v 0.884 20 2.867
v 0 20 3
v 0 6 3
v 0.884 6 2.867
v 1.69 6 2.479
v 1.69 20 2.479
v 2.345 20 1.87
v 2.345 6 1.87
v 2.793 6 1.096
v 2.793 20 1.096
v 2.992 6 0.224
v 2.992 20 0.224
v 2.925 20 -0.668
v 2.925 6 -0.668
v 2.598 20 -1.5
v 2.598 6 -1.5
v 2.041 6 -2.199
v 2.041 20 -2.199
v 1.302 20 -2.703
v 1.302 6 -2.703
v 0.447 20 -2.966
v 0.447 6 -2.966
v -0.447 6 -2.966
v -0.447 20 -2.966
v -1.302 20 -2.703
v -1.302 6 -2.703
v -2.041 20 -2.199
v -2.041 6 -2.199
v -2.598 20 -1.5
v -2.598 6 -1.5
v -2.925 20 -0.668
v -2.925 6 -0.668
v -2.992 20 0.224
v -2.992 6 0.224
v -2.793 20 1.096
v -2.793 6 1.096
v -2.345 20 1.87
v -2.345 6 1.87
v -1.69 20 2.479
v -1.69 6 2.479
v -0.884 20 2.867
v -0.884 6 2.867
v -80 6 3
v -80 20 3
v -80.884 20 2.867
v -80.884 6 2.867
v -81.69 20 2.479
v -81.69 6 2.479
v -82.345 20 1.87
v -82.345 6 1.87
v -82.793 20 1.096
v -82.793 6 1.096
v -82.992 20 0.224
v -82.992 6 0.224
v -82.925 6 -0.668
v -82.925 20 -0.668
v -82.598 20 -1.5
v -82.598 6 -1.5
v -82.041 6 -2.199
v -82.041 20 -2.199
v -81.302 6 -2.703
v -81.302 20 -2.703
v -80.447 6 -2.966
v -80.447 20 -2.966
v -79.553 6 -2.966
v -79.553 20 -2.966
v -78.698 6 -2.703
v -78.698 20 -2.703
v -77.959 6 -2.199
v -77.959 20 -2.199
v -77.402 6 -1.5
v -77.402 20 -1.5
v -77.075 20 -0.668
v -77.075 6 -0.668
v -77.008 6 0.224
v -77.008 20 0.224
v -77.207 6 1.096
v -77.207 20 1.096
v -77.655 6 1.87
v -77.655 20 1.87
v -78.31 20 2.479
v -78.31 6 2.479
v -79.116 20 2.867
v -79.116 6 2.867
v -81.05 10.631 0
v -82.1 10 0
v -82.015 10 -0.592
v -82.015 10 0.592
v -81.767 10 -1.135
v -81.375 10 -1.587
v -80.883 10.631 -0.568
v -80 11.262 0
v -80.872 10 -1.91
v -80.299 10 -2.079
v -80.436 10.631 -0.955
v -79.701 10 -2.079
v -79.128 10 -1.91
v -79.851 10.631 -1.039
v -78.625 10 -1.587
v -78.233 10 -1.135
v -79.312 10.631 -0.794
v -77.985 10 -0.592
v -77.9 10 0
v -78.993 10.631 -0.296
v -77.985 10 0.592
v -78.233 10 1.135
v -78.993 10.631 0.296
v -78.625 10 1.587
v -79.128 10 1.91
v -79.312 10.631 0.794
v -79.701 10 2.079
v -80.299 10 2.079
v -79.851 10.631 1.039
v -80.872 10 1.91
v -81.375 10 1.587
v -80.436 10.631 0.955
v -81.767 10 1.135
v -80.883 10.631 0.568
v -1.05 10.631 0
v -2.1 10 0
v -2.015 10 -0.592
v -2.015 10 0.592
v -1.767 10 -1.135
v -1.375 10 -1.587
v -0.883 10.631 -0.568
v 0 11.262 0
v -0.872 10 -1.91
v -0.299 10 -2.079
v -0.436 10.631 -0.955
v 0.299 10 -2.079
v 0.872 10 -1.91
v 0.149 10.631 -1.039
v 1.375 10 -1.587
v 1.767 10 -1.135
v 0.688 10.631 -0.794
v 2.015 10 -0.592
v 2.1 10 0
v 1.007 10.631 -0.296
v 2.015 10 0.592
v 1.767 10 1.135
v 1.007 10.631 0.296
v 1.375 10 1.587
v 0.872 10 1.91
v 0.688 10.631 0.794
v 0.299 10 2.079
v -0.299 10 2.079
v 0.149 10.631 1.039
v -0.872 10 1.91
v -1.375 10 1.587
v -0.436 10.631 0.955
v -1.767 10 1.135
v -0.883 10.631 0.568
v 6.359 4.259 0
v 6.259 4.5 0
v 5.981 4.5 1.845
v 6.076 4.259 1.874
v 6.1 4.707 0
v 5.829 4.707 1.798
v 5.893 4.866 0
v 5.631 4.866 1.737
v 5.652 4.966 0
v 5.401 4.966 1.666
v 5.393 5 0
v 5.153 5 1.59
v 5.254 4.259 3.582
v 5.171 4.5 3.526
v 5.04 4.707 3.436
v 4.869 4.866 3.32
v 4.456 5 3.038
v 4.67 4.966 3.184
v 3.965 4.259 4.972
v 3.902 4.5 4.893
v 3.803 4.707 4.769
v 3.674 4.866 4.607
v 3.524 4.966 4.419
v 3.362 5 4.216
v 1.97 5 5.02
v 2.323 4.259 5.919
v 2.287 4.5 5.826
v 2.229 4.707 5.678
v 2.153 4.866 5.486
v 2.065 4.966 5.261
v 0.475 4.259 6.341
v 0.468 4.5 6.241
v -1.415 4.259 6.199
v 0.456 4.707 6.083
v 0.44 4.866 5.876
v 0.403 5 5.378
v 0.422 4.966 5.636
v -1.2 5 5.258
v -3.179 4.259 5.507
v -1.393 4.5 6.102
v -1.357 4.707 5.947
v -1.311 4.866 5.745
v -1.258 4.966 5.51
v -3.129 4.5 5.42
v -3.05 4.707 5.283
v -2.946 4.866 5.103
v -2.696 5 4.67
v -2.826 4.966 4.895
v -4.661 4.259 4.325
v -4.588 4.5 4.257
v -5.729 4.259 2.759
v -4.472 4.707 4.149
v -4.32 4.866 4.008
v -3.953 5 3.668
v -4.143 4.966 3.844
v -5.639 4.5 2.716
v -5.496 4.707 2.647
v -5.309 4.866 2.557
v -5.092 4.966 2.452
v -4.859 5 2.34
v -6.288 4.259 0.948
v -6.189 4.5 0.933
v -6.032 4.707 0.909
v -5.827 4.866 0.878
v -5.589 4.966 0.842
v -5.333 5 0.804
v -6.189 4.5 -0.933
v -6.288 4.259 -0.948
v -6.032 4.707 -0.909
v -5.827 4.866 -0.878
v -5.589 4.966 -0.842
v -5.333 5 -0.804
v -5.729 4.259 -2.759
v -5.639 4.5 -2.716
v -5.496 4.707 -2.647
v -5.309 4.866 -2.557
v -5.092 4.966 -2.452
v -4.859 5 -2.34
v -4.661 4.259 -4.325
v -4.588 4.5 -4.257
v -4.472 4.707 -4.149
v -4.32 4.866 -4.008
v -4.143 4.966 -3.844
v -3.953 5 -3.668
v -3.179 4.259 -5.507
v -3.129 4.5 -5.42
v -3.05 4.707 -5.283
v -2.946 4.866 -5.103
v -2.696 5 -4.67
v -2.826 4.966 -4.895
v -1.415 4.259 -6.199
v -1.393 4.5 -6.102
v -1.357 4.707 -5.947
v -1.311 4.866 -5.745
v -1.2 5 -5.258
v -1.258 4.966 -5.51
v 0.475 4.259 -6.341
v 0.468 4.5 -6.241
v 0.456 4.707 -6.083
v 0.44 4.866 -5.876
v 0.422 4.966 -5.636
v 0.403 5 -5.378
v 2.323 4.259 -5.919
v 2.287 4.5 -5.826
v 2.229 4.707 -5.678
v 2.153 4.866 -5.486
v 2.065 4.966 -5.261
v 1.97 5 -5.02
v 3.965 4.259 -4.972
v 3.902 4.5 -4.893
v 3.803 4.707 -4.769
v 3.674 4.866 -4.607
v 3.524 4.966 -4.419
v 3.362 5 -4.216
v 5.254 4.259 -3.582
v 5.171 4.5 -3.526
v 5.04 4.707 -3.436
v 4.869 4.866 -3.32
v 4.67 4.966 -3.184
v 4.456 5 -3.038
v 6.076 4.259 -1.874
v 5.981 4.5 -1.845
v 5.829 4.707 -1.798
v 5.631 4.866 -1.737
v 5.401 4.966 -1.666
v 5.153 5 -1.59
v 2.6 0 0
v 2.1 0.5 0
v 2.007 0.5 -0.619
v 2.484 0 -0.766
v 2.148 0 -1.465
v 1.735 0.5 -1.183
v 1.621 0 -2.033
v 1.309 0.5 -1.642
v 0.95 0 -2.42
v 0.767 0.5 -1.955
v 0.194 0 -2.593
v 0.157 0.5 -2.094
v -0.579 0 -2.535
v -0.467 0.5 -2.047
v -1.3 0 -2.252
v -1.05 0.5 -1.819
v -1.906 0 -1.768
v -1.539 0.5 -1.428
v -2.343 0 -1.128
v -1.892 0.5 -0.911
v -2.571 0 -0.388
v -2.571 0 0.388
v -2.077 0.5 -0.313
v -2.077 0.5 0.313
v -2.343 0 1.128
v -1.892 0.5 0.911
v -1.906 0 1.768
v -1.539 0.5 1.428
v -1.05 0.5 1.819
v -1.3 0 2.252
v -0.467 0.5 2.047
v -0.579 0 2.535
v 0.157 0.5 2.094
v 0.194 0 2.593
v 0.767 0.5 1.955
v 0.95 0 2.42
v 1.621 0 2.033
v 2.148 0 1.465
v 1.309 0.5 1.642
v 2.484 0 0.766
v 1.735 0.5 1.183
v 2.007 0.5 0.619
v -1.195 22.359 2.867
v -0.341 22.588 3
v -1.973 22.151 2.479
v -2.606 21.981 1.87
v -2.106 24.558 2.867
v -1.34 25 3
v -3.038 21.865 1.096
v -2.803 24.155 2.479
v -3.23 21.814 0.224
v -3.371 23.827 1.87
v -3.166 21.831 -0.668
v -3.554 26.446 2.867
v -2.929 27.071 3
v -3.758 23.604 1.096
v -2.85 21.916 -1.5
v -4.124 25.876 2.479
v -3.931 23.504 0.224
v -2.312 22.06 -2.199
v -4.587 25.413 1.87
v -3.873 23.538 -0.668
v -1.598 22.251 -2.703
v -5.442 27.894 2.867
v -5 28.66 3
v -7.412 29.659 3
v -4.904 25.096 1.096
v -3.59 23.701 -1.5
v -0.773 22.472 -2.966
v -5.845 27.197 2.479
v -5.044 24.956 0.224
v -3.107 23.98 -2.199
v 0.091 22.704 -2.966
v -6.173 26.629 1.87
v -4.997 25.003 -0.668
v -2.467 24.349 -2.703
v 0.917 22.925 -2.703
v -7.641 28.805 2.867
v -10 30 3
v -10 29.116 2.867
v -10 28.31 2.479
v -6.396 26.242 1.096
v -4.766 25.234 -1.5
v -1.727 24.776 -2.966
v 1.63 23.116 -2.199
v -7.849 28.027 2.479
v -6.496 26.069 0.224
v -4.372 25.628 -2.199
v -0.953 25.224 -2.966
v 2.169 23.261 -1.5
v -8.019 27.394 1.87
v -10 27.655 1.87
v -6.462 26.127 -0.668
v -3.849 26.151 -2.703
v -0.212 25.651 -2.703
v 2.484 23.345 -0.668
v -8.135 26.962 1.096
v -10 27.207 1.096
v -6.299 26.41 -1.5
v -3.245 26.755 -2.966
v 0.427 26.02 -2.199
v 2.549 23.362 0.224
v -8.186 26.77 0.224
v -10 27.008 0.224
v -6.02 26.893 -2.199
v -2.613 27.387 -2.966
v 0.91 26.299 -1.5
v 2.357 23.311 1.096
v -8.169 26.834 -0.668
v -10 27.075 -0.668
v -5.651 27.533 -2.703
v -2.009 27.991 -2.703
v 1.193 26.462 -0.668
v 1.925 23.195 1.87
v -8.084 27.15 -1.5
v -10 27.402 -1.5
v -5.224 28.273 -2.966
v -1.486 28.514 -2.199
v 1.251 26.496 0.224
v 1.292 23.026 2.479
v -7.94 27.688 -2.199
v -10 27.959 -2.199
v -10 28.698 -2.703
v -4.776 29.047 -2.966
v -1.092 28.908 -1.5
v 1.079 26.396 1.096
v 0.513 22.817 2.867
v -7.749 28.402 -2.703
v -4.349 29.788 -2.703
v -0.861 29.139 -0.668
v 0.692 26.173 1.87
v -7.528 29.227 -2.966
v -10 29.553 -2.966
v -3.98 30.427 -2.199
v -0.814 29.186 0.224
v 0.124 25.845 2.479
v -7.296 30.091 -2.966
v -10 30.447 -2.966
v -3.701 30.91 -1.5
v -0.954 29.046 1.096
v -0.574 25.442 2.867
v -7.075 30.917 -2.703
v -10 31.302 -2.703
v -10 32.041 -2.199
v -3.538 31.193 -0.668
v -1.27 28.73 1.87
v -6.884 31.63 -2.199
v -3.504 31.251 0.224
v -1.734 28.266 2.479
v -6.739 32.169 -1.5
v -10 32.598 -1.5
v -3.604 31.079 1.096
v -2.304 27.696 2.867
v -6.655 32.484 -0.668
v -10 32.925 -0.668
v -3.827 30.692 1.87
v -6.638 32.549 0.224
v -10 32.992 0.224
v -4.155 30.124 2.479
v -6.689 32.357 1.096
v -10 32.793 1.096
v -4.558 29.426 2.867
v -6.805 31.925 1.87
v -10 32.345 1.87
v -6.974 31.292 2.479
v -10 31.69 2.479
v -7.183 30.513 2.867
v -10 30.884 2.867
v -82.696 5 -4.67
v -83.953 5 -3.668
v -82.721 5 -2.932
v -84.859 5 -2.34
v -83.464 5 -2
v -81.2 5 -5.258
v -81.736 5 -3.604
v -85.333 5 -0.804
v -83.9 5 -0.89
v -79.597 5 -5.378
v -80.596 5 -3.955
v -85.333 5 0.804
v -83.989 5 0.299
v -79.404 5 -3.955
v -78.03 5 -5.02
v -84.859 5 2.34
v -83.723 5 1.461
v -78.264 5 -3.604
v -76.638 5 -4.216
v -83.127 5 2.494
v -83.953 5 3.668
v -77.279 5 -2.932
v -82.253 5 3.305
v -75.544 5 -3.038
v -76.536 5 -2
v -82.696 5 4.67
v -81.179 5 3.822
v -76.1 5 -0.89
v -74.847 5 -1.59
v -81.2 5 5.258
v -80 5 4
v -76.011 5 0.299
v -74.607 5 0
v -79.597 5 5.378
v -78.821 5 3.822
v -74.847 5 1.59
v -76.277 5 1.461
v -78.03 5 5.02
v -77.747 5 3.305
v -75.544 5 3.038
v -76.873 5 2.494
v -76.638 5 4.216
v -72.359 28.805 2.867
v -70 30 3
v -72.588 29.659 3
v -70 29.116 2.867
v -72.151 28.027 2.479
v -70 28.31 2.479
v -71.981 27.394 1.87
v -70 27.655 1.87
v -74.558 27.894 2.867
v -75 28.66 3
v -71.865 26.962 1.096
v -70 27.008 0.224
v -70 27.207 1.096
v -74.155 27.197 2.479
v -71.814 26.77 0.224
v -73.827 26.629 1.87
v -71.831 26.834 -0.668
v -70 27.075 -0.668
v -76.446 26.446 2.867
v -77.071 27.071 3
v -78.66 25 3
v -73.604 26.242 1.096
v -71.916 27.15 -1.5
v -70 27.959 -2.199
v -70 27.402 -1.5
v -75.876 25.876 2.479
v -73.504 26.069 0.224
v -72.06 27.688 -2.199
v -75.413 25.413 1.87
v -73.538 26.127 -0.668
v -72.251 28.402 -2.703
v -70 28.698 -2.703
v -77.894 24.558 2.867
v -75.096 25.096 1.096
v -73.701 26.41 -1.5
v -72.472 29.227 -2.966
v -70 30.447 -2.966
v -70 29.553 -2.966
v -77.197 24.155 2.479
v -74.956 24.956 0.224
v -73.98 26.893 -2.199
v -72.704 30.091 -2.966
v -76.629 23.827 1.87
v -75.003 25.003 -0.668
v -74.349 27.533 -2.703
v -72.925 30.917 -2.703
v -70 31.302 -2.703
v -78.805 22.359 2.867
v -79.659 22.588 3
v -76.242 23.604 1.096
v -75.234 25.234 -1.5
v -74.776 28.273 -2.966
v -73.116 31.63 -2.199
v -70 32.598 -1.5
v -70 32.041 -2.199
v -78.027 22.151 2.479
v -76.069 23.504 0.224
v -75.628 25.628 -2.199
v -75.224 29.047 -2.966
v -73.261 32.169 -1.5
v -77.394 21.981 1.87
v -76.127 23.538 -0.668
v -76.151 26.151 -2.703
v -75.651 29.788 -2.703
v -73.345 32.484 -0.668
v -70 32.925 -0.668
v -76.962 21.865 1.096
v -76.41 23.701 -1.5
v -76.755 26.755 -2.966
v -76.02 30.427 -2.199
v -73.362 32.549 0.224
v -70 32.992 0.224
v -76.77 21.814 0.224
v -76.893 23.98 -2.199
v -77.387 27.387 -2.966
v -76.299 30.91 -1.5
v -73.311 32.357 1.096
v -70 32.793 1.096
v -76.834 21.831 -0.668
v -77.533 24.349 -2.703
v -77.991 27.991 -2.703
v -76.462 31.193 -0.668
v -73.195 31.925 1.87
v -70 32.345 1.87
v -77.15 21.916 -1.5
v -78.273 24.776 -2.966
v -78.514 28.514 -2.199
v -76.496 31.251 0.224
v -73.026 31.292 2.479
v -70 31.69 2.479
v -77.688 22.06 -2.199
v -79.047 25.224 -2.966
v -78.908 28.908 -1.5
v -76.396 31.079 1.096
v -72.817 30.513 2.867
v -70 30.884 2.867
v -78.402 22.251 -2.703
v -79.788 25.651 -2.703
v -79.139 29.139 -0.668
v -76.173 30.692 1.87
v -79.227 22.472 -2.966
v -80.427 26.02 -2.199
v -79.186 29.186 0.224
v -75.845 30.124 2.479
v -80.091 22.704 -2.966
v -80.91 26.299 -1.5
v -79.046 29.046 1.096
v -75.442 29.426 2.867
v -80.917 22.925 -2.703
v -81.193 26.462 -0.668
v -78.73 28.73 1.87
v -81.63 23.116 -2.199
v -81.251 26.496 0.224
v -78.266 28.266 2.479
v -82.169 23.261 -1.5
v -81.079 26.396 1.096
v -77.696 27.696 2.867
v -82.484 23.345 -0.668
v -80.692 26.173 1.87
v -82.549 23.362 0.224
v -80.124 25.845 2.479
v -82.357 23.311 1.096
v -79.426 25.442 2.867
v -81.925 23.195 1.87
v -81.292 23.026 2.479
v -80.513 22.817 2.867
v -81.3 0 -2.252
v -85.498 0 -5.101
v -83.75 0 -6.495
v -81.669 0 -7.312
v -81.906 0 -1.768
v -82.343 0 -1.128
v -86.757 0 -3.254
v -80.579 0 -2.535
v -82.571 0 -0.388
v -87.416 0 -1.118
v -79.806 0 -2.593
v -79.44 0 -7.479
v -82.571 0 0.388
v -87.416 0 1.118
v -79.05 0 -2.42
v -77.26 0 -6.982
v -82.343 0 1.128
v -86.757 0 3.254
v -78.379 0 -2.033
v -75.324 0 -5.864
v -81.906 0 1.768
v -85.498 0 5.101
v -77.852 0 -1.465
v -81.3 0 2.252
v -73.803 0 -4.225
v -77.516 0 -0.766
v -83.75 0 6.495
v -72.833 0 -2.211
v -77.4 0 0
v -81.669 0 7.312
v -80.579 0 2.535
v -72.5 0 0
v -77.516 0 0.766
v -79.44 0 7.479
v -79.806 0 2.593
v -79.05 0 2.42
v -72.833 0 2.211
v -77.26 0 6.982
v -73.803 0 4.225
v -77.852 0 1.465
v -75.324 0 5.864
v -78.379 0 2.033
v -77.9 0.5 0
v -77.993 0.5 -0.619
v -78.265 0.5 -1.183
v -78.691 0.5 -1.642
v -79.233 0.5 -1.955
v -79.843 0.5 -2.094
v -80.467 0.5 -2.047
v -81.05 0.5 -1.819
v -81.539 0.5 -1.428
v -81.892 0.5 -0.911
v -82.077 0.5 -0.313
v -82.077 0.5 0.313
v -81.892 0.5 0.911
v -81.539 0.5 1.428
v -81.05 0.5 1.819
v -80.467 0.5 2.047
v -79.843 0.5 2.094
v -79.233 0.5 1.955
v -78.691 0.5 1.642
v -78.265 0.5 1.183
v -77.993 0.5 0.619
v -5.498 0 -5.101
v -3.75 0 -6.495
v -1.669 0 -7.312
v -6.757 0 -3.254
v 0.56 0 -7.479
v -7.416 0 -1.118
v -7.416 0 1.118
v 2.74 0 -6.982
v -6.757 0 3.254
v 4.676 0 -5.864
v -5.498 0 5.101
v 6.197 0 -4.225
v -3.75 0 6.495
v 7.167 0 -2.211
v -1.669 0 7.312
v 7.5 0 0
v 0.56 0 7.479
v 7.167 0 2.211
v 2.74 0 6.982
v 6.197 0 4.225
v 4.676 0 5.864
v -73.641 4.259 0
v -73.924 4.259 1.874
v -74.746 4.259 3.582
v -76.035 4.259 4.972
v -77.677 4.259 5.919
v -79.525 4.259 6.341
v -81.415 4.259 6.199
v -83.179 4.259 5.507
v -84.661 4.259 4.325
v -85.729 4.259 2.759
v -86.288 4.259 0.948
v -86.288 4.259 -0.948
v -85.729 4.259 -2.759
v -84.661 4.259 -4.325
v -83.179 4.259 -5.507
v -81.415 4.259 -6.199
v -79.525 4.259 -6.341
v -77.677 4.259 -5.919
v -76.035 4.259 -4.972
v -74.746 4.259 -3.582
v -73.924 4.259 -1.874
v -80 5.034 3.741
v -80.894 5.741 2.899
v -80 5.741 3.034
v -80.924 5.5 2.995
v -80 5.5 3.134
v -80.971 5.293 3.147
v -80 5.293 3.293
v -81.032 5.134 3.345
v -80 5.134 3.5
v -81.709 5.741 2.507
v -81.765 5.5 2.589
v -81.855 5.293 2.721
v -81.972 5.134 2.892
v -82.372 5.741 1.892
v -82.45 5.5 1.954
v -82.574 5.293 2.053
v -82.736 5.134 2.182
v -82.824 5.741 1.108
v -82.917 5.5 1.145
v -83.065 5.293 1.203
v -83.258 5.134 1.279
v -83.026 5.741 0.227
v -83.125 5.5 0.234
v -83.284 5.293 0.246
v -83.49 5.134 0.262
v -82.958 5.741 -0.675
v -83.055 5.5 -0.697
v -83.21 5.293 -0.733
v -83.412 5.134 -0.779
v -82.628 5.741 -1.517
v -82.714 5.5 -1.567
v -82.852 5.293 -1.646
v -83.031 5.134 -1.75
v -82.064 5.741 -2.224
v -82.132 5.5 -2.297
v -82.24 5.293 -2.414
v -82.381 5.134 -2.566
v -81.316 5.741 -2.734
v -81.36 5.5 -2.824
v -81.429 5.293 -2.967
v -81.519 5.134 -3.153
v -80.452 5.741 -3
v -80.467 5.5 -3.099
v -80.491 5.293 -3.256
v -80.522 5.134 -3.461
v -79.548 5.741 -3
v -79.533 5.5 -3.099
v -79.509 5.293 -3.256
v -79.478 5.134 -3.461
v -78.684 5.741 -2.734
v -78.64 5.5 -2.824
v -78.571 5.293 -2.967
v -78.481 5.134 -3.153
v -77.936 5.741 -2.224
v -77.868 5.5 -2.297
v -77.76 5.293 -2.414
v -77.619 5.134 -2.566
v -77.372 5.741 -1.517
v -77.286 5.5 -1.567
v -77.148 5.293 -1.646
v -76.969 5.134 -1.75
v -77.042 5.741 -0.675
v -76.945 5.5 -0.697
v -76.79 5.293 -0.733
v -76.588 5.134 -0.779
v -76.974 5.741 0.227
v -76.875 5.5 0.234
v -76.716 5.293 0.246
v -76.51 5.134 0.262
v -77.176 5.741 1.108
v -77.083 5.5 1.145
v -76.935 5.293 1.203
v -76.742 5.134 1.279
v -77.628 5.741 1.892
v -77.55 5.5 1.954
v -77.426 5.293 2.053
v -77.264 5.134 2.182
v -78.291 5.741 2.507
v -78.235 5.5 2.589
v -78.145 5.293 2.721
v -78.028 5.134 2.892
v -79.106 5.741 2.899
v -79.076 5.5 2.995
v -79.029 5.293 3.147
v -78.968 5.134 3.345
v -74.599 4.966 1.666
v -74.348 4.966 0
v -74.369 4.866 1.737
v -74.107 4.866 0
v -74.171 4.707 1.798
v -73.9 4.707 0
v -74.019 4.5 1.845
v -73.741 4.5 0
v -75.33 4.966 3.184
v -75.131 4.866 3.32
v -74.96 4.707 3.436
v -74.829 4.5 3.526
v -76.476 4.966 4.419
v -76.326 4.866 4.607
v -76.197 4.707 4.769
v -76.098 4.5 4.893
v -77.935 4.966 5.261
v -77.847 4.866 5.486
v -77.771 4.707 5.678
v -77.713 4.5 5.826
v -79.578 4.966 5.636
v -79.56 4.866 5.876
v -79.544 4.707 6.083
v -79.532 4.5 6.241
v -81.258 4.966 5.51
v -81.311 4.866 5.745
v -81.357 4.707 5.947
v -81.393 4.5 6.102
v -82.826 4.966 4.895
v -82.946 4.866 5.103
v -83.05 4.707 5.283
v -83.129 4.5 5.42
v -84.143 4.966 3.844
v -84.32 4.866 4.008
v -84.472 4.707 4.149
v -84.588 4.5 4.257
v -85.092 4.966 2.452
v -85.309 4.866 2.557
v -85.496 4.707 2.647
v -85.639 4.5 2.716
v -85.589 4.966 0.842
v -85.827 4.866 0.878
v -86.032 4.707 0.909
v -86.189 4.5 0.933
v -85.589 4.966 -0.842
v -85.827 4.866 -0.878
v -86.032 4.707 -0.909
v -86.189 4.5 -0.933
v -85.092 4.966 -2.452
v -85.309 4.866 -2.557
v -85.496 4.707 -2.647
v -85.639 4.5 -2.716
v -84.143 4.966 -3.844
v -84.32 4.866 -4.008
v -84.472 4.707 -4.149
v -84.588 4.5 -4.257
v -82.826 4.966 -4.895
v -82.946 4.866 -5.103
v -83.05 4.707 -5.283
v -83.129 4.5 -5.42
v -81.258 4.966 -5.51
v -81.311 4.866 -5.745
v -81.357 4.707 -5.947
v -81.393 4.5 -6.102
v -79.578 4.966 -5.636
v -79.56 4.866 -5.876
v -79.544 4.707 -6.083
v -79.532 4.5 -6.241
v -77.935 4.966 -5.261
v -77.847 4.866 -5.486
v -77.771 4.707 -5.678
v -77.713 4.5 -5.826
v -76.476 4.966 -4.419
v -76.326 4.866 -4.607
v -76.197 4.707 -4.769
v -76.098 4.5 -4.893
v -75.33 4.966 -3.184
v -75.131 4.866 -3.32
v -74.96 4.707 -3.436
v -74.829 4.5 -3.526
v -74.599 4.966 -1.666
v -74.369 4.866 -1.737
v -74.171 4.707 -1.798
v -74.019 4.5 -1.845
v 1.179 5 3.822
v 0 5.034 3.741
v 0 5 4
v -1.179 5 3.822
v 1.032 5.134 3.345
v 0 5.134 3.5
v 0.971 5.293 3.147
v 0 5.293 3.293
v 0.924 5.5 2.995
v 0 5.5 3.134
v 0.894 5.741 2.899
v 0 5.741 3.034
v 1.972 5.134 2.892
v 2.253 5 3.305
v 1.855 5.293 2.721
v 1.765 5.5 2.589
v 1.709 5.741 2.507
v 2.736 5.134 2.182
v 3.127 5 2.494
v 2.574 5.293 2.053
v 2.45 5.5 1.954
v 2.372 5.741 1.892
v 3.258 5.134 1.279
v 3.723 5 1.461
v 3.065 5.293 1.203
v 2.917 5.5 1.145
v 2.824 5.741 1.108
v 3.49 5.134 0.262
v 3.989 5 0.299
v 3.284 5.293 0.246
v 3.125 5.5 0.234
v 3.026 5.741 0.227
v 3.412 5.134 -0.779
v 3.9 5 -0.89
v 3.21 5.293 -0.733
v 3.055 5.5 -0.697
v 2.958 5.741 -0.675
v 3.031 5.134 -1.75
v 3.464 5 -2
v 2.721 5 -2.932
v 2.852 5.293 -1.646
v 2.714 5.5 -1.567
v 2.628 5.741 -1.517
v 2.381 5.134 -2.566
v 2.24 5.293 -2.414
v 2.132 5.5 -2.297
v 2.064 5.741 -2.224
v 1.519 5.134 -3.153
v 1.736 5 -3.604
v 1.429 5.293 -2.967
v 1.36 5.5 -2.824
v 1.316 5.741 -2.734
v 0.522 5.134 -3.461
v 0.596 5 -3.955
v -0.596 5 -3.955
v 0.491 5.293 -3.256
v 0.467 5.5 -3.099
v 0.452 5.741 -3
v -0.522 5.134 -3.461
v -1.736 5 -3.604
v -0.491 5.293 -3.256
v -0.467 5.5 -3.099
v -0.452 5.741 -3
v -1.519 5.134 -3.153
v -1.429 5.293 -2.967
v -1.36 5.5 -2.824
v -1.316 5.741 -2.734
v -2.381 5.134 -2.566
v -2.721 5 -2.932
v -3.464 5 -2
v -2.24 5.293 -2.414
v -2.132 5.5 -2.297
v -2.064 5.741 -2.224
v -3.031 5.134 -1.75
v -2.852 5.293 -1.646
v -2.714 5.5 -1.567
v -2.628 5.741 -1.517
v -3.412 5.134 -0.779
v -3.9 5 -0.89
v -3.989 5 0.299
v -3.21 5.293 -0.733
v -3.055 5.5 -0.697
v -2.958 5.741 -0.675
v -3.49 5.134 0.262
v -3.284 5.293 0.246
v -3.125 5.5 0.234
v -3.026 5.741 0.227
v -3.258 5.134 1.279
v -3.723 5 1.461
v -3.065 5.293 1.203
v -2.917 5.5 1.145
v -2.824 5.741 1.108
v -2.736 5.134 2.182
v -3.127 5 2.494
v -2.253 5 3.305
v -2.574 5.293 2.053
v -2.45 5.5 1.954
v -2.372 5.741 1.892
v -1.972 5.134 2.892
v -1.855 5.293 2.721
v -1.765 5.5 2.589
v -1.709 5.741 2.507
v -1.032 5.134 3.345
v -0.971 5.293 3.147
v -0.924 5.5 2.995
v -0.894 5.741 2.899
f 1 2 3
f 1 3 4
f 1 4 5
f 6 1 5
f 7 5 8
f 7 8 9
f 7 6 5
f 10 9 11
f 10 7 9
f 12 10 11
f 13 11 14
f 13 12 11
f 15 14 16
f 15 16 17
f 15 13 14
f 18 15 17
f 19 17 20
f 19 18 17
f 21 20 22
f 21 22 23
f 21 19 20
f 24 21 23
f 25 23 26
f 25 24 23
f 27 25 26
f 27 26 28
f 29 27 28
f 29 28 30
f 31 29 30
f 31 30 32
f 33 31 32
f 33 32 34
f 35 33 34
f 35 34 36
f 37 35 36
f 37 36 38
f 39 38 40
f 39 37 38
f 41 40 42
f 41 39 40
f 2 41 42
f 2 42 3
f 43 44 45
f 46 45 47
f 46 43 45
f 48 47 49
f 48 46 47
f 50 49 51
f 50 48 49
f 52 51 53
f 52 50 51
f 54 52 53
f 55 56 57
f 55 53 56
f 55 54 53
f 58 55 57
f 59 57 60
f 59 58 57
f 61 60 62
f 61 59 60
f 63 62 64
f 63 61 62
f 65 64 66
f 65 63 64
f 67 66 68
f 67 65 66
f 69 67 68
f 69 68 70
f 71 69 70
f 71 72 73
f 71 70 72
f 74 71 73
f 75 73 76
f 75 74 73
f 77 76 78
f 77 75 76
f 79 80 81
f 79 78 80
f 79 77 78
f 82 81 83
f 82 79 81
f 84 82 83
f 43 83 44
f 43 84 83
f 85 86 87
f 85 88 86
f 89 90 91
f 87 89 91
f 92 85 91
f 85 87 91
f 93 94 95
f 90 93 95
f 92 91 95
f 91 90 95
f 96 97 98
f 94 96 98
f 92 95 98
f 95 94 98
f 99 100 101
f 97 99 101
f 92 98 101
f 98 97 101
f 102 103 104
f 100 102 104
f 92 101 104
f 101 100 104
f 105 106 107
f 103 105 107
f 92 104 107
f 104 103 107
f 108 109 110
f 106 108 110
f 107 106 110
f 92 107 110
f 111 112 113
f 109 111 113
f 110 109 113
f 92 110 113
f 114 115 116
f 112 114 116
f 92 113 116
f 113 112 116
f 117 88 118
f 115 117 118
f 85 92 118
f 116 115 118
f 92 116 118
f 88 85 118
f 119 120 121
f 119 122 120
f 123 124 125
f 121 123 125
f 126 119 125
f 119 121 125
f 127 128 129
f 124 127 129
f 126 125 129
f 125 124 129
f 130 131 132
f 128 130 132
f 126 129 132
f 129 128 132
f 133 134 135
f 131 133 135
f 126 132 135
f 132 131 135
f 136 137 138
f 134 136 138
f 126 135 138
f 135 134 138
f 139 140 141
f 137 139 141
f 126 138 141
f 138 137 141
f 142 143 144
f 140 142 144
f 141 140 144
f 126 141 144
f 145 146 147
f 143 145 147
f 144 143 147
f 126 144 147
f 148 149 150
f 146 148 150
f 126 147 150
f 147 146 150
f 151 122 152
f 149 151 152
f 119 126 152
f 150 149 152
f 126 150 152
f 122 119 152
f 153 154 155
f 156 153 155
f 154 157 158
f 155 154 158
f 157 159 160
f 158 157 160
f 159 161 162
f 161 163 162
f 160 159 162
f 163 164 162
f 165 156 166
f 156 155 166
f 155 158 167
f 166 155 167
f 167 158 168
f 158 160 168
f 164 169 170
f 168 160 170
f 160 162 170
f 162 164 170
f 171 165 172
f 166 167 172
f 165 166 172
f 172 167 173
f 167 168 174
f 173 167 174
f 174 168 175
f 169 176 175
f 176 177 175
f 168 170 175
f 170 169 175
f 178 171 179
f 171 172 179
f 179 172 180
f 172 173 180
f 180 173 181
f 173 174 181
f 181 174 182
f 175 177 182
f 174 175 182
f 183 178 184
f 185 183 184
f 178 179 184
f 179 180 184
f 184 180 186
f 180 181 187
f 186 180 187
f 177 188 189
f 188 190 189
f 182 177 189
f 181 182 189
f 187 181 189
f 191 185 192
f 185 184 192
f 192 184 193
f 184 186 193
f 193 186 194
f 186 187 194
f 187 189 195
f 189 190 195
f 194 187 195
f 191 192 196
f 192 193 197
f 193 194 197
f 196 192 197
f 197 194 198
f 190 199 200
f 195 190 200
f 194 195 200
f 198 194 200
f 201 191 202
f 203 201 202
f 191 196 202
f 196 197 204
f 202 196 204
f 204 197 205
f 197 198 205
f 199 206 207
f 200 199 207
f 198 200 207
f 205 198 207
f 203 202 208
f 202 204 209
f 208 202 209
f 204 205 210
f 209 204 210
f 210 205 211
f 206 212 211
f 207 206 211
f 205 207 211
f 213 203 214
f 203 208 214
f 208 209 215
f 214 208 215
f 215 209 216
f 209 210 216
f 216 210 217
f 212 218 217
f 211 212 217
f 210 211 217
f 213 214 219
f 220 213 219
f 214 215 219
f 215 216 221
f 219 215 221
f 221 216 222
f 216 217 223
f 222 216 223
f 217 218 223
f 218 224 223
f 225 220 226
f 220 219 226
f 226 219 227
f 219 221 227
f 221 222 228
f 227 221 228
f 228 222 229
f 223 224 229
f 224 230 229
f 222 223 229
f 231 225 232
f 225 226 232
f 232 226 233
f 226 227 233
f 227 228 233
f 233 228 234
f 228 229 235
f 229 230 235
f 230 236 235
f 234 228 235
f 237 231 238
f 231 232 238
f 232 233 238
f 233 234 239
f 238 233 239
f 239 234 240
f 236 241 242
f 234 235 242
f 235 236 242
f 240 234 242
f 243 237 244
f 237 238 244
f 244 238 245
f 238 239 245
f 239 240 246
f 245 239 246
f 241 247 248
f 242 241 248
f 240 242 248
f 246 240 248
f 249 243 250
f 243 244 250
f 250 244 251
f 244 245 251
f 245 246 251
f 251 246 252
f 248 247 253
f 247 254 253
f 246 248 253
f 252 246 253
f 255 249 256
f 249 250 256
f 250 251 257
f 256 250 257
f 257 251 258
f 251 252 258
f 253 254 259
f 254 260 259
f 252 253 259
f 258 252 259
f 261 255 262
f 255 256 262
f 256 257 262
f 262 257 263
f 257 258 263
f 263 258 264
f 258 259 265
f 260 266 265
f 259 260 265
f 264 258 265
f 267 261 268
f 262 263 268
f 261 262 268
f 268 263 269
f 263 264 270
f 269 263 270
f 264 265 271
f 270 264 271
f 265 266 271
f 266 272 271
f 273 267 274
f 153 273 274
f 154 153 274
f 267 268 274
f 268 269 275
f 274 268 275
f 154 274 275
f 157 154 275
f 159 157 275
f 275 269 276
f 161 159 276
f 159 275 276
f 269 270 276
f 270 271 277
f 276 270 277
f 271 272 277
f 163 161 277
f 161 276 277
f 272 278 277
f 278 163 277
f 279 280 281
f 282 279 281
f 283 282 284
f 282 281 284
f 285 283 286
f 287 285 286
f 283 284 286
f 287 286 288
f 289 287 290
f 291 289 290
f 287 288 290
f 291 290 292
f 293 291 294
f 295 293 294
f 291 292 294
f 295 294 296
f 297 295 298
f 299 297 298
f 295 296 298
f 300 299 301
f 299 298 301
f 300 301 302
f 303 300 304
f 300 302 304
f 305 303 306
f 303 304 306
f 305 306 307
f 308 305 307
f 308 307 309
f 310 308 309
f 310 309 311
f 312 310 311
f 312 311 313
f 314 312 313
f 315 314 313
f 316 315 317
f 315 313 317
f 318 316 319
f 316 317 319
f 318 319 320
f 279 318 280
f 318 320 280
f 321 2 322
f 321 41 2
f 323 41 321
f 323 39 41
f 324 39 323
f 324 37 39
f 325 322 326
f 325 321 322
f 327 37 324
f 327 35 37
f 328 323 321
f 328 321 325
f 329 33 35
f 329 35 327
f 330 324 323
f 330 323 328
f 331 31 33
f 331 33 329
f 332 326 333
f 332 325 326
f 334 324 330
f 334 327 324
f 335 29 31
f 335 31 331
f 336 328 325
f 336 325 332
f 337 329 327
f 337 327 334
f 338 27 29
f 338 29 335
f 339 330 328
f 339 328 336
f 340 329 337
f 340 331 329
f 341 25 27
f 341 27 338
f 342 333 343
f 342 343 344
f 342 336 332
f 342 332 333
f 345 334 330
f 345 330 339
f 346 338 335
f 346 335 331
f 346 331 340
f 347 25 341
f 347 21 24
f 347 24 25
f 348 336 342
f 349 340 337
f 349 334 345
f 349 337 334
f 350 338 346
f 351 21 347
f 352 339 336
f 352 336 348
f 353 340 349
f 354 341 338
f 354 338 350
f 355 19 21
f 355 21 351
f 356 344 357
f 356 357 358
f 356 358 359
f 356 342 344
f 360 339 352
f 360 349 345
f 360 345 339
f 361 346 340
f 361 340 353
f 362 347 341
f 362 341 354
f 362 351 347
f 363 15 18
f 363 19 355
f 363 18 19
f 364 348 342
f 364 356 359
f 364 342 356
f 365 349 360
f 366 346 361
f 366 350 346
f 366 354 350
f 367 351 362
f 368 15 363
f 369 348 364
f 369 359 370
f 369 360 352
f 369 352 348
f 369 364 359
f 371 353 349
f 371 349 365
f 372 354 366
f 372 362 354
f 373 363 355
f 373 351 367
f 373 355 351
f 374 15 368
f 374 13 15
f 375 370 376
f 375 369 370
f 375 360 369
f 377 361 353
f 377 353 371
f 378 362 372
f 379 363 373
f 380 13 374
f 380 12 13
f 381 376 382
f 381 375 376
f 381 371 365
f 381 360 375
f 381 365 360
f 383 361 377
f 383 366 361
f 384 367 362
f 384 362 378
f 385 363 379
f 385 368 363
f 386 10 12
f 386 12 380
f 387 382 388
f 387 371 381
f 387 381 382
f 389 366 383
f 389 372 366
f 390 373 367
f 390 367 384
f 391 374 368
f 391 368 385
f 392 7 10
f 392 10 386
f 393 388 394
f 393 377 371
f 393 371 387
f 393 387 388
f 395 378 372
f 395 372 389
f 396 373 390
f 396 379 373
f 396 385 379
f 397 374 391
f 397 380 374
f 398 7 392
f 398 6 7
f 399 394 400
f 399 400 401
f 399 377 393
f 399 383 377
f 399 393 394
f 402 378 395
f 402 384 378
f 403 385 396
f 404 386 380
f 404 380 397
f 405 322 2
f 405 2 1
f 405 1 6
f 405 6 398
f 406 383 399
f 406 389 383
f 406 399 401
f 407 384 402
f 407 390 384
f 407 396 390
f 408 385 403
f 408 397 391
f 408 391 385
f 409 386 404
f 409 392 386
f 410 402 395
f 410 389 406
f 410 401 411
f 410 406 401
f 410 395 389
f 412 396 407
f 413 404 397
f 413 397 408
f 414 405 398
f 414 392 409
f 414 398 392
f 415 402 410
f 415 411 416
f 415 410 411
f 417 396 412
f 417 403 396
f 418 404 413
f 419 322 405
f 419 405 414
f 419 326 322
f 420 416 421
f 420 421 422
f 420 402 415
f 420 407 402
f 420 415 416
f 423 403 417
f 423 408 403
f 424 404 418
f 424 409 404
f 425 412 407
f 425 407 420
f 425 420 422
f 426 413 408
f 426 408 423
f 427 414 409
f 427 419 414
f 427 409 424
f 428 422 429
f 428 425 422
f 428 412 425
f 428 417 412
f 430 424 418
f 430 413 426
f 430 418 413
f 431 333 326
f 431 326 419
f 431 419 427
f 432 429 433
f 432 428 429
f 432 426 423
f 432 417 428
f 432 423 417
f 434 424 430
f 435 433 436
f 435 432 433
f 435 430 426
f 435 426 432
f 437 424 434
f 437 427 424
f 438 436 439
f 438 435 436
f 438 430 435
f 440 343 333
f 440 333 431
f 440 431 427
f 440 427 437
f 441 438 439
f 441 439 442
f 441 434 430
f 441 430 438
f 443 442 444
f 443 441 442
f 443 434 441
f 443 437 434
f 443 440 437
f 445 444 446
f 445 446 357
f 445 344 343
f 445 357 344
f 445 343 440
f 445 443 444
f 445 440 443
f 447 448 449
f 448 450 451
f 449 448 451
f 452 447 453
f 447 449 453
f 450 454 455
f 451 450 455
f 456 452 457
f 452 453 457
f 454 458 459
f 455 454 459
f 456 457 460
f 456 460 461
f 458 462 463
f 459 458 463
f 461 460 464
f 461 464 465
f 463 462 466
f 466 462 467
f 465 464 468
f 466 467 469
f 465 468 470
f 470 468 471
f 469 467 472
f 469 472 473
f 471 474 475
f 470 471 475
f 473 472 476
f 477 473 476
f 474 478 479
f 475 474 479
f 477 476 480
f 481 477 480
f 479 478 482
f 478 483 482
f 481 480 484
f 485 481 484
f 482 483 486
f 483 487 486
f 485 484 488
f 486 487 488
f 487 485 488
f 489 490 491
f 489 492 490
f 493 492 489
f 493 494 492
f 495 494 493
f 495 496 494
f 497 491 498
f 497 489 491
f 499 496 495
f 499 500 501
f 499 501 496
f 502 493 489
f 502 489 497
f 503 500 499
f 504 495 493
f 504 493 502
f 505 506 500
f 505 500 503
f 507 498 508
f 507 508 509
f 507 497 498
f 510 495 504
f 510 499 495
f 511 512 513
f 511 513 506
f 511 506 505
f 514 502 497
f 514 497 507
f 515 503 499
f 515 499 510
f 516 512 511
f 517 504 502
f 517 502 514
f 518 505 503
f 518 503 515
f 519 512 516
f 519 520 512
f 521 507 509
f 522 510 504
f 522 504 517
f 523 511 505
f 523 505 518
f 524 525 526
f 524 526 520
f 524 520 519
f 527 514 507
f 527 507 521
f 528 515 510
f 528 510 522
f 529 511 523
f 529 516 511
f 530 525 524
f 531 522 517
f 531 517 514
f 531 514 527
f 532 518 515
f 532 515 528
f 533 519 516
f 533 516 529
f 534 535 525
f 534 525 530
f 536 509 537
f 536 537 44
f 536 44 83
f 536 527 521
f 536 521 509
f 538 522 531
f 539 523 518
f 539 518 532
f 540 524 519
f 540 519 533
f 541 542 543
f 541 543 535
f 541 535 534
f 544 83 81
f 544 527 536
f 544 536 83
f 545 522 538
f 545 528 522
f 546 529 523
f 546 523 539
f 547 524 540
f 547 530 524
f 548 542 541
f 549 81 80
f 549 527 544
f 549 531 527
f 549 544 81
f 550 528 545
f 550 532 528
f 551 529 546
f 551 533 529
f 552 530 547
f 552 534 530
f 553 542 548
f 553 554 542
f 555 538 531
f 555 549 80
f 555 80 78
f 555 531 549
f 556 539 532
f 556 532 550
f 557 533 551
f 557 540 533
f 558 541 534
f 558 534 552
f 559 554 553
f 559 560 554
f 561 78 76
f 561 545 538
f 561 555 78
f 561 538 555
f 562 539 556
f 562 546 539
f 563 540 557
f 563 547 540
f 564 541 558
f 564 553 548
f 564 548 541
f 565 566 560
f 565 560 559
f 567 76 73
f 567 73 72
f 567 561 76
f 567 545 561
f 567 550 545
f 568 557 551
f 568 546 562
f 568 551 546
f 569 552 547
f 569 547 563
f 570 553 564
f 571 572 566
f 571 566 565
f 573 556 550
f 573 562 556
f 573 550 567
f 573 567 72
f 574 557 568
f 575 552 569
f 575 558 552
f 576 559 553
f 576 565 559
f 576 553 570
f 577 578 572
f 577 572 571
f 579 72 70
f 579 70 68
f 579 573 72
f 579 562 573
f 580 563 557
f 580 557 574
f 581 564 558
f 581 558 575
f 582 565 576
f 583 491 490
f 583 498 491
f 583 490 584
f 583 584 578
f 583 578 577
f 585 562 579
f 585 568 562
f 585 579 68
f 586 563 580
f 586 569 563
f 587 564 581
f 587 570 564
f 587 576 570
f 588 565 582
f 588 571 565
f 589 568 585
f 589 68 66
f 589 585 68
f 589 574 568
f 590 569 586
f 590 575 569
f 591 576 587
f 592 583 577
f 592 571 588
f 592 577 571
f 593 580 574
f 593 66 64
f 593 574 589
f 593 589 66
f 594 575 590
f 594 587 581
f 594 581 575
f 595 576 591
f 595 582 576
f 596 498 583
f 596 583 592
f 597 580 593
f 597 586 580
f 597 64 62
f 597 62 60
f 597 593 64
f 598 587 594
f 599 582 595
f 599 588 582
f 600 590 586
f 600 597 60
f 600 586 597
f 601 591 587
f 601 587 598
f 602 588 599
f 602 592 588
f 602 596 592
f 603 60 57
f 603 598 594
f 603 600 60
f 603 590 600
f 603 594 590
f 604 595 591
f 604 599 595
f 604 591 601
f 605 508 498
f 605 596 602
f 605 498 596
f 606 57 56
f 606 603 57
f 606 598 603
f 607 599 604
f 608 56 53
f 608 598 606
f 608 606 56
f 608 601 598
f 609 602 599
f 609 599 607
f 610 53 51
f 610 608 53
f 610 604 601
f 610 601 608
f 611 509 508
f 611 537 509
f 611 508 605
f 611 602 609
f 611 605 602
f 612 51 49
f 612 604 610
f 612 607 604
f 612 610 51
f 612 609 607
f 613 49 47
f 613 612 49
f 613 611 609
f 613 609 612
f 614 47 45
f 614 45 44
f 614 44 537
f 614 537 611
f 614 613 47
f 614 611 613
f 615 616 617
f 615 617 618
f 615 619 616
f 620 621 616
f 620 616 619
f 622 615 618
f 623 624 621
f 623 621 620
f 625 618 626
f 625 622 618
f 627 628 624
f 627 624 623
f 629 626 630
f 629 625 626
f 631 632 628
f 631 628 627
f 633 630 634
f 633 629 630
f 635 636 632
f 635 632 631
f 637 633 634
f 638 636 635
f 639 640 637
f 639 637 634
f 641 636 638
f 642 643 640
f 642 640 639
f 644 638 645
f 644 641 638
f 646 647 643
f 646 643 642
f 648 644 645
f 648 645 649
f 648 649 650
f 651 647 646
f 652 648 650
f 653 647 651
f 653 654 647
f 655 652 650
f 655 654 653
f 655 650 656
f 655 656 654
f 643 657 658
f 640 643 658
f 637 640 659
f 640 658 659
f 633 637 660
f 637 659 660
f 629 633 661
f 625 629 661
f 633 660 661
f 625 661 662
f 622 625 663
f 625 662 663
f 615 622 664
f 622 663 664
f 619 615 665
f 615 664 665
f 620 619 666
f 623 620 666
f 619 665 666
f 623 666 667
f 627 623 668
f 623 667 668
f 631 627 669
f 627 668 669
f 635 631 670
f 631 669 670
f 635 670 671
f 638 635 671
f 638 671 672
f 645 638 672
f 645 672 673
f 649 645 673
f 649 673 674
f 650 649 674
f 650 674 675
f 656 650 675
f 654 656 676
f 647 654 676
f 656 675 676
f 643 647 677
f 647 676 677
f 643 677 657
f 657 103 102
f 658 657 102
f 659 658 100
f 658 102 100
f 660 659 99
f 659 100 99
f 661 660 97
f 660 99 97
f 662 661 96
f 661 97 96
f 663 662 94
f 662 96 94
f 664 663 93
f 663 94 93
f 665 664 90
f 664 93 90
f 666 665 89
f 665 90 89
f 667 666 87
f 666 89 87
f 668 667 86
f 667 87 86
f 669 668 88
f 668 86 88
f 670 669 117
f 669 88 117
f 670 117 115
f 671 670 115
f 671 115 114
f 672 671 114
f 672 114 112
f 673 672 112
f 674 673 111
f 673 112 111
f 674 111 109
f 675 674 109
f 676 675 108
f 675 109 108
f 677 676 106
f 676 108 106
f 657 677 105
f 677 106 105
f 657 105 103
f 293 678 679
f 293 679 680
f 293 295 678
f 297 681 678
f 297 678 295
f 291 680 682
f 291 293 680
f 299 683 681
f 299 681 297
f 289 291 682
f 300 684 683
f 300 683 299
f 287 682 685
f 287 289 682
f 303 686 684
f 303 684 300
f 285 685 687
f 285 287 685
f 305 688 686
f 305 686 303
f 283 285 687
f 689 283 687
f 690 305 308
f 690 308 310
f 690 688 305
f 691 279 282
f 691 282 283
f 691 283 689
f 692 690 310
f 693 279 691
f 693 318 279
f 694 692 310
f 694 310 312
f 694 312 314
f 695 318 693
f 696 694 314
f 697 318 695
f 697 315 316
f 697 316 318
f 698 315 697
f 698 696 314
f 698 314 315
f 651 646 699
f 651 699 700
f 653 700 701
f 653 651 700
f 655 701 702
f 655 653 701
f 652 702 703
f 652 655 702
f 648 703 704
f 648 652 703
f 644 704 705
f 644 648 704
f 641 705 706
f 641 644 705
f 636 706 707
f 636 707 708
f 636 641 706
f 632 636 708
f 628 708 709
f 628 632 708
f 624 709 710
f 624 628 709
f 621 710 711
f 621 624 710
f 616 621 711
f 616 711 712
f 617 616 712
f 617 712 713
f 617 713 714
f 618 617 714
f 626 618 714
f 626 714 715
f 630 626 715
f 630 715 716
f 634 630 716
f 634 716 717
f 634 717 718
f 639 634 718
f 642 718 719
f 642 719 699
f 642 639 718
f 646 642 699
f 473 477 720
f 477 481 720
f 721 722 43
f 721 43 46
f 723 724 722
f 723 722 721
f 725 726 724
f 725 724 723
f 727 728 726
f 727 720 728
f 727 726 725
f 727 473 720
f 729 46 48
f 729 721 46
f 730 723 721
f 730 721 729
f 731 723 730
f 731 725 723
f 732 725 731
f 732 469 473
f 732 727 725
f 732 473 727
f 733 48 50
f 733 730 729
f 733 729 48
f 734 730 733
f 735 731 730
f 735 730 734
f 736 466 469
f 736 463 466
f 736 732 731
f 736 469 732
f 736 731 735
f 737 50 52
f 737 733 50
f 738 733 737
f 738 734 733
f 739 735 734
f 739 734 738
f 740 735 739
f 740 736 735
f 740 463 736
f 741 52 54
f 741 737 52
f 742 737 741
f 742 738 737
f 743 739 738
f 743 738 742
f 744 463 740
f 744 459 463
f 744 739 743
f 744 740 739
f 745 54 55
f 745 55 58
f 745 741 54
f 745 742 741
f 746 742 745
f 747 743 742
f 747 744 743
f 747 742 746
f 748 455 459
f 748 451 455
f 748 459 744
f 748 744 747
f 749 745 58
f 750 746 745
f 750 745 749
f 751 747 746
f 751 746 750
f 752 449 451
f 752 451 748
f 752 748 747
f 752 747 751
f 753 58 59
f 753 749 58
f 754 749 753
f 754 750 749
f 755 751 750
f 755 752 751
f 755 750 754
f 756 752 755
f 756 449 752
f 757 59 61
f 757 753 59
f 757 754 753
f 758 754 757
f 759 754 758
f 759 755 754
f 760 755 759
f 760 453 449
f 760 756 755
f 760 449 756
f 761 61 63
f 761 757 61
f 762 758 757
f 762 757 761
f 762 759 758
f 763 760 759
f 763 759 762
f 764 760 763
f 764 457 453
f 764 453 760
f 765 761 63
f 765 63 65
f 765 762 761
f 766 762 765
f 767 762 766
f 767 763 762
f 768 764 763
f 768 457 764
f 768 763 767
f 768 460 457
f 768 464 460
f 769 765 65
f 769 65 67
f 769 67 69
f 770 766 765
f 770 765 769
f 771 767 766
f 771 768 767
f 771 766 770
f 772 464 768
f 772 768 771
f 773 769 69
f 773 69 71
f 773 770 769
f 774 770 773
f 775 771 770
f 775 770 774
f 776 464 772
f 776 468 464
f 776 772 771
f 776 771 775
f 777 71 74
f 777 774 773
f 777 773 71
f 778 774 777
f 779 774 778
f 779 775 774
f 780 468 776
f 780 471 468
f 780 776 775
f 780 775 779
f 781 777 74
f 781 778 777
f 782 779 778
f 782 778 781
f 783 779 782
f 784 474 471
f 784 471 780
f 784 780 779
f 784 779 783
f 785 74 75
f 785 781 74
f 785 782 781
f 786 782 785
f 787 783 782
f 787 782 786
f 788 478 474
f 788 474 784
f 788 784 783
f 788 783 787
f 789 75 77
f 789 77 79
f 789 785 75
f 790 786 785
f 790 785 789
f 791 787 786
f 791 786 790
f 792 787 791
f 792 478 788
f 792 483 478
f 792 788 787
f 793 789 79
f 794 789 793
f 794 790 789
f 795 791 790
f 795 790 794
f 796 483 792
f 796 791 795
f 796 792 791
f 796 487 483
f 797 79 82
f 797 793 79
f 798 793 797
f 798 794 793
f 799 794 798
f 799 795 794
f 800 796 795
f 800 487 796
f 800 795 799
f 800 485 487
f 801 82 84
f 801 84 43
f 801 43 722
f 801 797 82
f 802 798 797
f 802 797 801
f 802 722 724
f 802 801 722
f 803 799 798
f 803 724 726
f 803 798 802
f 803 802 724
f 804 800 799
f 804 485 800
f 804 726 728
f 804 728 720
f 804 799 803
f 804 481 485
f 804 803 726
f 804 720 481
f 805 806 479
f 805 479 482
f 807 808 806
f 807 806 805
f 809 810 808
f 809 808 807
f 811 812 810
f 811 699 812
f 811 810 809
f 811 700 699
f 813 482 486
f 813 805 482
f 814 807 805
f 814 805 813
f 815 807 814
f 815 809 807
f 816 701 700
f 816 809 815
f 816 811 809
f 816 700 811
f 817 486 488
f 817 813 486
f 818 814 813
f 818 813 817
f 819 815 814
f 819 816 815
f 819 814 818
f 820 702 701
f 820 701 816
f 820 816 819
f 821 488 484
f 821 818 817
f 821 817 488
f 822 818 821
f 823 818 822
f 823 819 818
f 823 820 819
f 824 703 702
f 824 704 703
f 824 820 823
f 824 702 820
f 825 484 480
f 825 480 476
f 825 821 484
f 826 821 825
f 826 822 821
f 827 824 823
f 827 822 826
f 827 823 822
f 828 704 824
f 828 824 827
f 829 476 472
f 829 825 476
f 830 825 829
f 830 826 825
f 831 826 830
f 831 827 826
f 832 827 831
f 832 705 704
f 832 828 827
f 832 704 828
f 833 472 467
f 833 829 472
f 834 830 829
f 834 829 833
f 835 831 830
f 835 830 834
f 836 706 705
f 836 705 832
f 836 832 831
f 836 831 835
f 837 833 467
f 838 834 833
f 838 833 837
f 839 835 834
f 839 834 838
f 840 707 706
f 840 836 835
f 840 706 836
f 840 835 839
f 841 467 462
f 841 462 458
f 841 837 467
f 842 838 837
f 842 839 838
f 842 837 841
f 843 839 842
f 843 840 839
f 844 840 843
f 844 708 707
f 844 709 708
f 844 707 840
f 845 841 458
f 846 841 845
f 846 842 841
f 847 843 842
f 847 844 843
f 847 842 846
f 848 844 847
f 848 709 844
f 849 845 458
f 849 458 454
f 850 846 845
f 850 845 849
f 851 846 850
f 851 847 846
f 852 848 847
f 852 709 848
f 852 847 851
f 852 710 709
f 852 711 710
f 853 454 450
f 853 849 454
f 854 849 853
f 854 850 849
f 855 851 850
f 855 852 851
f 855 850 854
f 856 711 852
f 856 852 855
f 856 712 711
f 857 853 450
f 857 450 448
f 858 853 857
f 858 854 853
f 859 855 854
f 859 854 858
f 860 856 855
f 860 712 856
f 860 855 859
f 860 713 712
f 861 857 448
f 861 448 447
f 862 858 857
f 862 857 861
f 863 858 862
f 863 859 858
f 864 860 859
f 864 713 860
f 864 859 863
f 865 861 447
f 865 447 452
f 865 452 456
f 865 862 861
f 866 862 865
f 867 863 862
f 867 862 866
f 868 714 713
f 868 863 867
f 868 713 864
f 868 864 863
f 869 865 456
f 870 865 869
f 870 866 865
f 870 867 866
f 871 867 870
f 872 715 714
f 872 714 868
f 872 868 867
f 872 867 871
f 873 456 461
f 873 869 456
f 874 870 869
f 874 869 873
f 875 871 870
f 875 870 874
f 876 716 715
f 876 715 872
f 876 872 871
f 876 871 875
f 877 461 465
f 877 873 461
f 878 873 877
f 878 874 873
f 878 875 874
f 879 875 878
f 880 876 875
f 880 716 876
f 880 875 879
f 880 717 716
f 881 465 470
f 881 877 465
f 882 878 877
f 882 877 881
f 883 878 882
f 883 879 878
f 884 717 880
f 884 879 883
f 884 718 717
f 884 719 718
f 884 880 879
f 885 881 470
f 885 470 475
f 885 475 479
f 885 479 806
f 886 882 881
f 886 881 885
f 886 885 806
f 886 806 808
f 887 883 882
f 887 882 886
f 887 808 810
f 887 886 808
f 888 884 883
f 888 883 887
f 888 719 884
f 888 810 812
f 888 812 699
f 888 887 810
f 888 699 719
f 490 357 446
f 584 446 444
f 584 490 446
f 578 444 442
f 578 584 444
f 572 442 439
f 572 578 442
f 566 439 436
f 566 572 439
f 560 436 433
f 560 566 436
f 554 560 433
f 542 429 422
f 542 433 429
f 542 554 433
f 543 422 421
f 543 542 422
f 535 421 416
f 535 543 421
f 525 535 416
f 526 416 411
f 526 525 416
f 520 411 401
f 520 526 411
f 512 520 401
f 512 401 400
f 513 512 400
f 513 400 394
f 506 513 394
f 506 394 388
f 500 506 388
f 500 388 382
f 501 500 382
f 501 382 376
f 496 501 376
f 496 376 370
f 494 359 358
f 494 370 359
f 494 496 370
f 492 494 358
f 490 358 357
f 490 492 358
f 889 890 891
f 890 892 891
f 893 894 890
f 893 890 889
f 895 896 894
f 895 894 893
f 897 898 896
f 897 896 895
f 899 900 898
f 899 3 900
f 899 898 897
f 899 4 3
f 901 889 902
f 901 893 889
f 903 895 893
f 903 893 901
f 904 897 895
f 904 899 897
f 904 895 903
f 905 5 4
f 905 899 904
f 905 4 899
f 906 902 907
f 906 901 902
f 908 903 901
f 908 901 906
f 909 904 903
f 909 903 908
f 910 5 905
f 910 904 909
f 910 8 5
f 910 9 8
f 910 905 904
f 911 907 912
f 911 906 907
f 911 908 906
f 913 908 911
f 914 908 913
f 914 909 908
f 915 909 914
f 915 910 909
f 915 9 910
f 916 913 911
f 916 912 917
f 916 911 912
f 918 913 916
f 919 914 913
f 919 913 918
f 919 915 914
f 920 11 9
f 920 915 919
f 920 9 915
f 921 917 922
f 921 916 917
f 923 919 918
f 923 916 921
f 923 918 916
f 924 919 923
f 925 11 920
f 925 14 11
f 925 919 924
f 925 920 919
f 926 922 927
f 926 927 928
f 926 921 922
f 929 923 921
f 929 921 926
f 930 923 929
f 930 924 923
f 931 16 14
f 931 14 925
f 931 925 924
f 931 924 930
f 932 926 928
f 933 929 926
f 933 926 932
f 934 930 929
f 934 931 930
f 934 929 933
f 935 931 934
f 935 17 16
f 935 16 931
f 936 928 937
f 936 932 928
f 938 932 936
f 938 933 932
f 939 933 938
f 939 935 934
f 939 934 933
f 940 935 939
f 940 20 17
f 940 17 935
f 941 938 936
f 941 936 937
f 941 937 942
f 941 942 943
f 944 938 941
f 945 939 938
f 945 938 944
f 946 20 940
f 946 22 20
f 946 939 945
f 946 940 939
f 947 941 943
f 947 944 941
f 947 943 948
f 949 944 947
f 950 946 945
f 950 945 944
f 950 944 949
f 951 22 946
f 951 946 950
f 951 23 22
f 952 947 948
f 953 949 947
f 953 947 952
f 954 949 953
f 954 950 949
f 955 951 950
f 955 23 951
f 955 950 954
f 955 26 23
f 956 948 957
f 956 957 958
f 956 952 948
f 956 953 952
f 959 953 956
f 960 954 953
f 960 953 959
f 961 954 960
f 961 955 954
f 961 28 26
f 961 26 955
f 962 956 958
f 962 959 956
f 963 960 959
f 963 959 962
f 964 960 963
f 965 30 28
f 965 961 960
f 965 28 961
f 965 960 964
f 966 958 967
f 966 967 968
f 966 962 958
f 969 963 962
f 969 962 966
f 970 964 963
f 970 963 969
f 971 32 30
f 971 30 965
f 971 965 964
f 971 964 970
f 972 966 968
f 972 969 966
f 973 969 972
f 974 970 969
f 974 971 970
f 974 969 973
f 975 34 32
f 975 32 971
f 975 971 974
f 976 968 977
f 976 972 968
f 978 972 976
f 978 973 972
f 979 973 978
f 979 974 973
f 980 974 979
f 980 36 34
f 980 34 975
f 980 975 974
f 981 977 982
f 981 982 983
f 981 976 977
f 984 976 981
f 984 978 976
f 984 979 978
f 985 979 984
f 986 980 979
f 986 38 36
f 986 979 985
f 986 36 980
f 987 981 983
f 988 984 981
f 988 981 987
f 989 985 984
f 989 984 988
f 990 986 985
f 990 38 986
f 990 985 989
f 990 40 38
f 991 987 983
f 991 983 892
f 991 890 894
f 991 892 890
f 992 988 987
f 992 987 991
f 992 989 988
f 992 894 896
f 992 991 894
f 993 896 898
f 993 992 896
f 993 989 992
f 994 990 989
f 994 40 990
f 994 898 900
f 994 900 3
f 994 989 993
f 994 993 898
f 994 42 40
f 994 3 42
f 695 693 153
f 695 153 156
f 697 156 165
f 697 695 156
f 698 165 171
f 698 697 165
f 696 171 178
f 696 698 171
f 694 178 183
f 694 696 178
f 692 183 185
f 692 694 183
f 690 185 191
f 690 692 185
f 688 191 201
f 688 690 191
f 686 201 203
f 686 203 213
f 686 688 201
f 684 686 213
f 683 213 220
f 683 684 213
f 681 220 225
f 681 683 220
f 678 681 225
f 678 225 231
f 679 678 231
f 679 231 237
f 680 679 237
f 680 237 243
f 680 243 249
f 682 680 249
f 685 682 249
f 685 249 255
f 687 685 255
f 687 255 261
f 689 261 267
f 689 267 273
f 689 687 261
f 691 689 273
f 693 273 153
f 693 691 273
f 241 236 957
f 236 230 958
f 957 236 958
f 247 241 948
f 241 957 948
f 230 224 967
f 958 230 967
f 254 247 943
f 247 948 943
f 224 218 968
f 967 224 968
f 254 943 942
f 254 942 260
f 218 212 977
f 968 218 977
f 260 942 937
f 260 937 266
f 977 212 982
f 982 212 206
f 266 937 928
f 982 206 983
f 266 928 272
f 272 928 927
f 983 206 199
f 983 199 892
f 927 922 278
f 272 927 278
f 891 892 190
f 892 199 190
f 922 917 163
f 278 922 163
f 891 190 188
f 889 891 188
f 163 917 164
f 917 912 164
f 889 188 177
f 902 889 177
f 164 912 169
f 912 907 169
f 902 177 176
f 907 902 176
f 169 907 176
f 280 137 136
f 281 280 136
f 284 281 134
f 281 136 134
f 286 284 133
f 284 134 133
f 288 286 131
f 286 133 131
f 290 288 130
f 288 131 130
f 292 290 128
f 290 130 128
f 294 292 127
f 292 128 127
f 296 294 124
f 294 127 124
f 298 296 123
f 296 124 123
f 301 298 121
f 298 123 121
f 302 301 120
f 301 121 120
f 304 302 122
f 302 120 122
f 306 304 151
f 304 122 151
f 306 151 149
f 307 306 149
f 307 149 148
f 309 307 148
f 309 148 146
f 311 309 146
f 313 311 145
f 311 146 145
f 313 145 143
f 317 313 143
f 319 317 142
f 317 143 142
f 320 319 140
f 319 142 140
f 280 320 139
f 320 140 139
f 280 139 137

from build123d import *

# Parameters (mm, degrees)
SWEEP1_PROFILE_R              = 3
SKETCH10_R                    = 7.5
BOSS_EXTRUDE1_DEPTH           = 5
BOSS_EXTRUDE1_DRAFT           = -15
BOSS_EXTRUDE1_PROFILE_2_DEPTH = 5
BOSS_EXTRUDE1_PROFILE_2_DRAFT = -15
FILLET2_R                     = 1
M5X0_8_TAPPED_HOLE1_D         = 4.2
M5X0_8_TAPPED_HOLE1_DEPTH     = 10
M5X0_8_TAPPED_HOLE1_TIP       = 1.2618073
CHAMFER1_SIZE                 = 0.5


with BuildPart() as part:
    # Sweep1: sweep along a path in Sketch1
    with BuildLine(Plane.XY) as sweep1_path:
        Line((0, 0), (0, 20))
        ThreePointArc((0, 20), (-2.928932188, 27.071067812), (-10, 30))
        Line((-10, 30), (-70, 30))
        ThreePointArc((-70, 30), (-77.071067812, 27.071067812), (-80, 20))
        Line((-80, 20), (-80, 0))
    # Sweep1 profile (on start of the path) → Sweep1 (sweep)
    with BuildSketch(Plane.ZX):
        Circle(SWEEP1_PROFILE_R)
    sweep(path=sweep1_path.line)


with BuildPart() as boss_extrude1_tool:
    # Sketch10 → Boss-Extrude1 (with draft: the straight prism first)
    with BuildSketch(Plane.XZ):
        with Locations((-80, 0)):
            Circle(SKETCH10_R)
    extrude(amount=-BOSS_EXTRUDE1_DEPTH)
    # Boss-Extrude1: the draft: its side faces are tilted about the plane it starts from
    boss_extrude1_sides = [boss_extrude1_tool.faces().sort_by_distance(p)[0] for p in [
        (-87.5, 2.5, 0),
    ]]
    draft(boss_extrude1_sides, Plane.XZ, BOSS_EXTRUDE1_DRAFT)


with BuildPart() as part_1:
    add(part.part)

    # Boss-Extrude1: add boss_extrude1_tool
    add(boss_extrude1_tool.part)


with BuildPart() as boss_extrude1_profile_2_tool:
    # Sketch10 → Boss-Extrude1 profile 2 (with draft: the straight prism first)
    with BuildSketch(Plane.XZ):
        Circle(SKETCH10_R)
    extrude(amount=-BOSS_EXTRUDE1_PROFILE_2_DEPTH)
    # Boss-Extrude1 profile 2: the draft: its side faces are tilted about the plane it starts from
    boss_extrude1_profile_2_sides = [boss_extrude1_profile_2_tool.faces().sort_by_distance(p)[0] for p in [
        (-7.5, 2.5, 0),
    ]]
    draft(boss_extrude1_profile_2_sides, Plane.XZ, BOSS_EXTRUDE1_PROFILE_2_DRAFT)


with BuildPart() as part_2:
    add(part_1.part)

    # Boss-Extrude1 profile 2: add boss_extrude1_profile_2_tool
    add(boss_extrude1_profile_2_tool.part)

    # Fillet2
    fillet2_edges = [part_2.edges().sort_by_distance(p)[0] for p in [
        (-80, 5, -3),
        (-86.160254038, 5, 0),
        (0, 5, -3),
        (-6.160254038, 5, 0),
    ]]
    fillet(fillet2_edges, radius=FILLET2_R)

    # M5x0.8 Tapped Hole1
    with Locations(Plane(origin=(0, 0, 0), x_dir=(-1, 0, 0), z_dir=(0, -1, 0))):
        with Locations((80, 0), (0, 0)):
            Hole(M5X0_8_TAPPED_HOLE1_D / 2, depth=M5X0_8_TAPPED_HOLE1_DEPTH)
            with Locations((0, 0, -(M5X0_8_TAPPED_HOLE1_DEPTH + M5X0_8_TAPPED_HOLE1_TIP / 2))):  # 118° drill point
                Cone(0, M5X0_8_TAPPED_HOLE1_D / 2, M5X0_8_TAPPED_HOLE1_TIP, mode=Mode.SUBTRACT)

    # Chamfer1
    chamfer1_edges = [part_2.edges().sort_by_distance(p)[0] for p in [
        (-2.1, 0, 0),
        (-82.1, 0, 0),
    ]]
    chamfer(chamfer1_edges, length=CHAMFER1_SIZE)


solid = part_2.part
